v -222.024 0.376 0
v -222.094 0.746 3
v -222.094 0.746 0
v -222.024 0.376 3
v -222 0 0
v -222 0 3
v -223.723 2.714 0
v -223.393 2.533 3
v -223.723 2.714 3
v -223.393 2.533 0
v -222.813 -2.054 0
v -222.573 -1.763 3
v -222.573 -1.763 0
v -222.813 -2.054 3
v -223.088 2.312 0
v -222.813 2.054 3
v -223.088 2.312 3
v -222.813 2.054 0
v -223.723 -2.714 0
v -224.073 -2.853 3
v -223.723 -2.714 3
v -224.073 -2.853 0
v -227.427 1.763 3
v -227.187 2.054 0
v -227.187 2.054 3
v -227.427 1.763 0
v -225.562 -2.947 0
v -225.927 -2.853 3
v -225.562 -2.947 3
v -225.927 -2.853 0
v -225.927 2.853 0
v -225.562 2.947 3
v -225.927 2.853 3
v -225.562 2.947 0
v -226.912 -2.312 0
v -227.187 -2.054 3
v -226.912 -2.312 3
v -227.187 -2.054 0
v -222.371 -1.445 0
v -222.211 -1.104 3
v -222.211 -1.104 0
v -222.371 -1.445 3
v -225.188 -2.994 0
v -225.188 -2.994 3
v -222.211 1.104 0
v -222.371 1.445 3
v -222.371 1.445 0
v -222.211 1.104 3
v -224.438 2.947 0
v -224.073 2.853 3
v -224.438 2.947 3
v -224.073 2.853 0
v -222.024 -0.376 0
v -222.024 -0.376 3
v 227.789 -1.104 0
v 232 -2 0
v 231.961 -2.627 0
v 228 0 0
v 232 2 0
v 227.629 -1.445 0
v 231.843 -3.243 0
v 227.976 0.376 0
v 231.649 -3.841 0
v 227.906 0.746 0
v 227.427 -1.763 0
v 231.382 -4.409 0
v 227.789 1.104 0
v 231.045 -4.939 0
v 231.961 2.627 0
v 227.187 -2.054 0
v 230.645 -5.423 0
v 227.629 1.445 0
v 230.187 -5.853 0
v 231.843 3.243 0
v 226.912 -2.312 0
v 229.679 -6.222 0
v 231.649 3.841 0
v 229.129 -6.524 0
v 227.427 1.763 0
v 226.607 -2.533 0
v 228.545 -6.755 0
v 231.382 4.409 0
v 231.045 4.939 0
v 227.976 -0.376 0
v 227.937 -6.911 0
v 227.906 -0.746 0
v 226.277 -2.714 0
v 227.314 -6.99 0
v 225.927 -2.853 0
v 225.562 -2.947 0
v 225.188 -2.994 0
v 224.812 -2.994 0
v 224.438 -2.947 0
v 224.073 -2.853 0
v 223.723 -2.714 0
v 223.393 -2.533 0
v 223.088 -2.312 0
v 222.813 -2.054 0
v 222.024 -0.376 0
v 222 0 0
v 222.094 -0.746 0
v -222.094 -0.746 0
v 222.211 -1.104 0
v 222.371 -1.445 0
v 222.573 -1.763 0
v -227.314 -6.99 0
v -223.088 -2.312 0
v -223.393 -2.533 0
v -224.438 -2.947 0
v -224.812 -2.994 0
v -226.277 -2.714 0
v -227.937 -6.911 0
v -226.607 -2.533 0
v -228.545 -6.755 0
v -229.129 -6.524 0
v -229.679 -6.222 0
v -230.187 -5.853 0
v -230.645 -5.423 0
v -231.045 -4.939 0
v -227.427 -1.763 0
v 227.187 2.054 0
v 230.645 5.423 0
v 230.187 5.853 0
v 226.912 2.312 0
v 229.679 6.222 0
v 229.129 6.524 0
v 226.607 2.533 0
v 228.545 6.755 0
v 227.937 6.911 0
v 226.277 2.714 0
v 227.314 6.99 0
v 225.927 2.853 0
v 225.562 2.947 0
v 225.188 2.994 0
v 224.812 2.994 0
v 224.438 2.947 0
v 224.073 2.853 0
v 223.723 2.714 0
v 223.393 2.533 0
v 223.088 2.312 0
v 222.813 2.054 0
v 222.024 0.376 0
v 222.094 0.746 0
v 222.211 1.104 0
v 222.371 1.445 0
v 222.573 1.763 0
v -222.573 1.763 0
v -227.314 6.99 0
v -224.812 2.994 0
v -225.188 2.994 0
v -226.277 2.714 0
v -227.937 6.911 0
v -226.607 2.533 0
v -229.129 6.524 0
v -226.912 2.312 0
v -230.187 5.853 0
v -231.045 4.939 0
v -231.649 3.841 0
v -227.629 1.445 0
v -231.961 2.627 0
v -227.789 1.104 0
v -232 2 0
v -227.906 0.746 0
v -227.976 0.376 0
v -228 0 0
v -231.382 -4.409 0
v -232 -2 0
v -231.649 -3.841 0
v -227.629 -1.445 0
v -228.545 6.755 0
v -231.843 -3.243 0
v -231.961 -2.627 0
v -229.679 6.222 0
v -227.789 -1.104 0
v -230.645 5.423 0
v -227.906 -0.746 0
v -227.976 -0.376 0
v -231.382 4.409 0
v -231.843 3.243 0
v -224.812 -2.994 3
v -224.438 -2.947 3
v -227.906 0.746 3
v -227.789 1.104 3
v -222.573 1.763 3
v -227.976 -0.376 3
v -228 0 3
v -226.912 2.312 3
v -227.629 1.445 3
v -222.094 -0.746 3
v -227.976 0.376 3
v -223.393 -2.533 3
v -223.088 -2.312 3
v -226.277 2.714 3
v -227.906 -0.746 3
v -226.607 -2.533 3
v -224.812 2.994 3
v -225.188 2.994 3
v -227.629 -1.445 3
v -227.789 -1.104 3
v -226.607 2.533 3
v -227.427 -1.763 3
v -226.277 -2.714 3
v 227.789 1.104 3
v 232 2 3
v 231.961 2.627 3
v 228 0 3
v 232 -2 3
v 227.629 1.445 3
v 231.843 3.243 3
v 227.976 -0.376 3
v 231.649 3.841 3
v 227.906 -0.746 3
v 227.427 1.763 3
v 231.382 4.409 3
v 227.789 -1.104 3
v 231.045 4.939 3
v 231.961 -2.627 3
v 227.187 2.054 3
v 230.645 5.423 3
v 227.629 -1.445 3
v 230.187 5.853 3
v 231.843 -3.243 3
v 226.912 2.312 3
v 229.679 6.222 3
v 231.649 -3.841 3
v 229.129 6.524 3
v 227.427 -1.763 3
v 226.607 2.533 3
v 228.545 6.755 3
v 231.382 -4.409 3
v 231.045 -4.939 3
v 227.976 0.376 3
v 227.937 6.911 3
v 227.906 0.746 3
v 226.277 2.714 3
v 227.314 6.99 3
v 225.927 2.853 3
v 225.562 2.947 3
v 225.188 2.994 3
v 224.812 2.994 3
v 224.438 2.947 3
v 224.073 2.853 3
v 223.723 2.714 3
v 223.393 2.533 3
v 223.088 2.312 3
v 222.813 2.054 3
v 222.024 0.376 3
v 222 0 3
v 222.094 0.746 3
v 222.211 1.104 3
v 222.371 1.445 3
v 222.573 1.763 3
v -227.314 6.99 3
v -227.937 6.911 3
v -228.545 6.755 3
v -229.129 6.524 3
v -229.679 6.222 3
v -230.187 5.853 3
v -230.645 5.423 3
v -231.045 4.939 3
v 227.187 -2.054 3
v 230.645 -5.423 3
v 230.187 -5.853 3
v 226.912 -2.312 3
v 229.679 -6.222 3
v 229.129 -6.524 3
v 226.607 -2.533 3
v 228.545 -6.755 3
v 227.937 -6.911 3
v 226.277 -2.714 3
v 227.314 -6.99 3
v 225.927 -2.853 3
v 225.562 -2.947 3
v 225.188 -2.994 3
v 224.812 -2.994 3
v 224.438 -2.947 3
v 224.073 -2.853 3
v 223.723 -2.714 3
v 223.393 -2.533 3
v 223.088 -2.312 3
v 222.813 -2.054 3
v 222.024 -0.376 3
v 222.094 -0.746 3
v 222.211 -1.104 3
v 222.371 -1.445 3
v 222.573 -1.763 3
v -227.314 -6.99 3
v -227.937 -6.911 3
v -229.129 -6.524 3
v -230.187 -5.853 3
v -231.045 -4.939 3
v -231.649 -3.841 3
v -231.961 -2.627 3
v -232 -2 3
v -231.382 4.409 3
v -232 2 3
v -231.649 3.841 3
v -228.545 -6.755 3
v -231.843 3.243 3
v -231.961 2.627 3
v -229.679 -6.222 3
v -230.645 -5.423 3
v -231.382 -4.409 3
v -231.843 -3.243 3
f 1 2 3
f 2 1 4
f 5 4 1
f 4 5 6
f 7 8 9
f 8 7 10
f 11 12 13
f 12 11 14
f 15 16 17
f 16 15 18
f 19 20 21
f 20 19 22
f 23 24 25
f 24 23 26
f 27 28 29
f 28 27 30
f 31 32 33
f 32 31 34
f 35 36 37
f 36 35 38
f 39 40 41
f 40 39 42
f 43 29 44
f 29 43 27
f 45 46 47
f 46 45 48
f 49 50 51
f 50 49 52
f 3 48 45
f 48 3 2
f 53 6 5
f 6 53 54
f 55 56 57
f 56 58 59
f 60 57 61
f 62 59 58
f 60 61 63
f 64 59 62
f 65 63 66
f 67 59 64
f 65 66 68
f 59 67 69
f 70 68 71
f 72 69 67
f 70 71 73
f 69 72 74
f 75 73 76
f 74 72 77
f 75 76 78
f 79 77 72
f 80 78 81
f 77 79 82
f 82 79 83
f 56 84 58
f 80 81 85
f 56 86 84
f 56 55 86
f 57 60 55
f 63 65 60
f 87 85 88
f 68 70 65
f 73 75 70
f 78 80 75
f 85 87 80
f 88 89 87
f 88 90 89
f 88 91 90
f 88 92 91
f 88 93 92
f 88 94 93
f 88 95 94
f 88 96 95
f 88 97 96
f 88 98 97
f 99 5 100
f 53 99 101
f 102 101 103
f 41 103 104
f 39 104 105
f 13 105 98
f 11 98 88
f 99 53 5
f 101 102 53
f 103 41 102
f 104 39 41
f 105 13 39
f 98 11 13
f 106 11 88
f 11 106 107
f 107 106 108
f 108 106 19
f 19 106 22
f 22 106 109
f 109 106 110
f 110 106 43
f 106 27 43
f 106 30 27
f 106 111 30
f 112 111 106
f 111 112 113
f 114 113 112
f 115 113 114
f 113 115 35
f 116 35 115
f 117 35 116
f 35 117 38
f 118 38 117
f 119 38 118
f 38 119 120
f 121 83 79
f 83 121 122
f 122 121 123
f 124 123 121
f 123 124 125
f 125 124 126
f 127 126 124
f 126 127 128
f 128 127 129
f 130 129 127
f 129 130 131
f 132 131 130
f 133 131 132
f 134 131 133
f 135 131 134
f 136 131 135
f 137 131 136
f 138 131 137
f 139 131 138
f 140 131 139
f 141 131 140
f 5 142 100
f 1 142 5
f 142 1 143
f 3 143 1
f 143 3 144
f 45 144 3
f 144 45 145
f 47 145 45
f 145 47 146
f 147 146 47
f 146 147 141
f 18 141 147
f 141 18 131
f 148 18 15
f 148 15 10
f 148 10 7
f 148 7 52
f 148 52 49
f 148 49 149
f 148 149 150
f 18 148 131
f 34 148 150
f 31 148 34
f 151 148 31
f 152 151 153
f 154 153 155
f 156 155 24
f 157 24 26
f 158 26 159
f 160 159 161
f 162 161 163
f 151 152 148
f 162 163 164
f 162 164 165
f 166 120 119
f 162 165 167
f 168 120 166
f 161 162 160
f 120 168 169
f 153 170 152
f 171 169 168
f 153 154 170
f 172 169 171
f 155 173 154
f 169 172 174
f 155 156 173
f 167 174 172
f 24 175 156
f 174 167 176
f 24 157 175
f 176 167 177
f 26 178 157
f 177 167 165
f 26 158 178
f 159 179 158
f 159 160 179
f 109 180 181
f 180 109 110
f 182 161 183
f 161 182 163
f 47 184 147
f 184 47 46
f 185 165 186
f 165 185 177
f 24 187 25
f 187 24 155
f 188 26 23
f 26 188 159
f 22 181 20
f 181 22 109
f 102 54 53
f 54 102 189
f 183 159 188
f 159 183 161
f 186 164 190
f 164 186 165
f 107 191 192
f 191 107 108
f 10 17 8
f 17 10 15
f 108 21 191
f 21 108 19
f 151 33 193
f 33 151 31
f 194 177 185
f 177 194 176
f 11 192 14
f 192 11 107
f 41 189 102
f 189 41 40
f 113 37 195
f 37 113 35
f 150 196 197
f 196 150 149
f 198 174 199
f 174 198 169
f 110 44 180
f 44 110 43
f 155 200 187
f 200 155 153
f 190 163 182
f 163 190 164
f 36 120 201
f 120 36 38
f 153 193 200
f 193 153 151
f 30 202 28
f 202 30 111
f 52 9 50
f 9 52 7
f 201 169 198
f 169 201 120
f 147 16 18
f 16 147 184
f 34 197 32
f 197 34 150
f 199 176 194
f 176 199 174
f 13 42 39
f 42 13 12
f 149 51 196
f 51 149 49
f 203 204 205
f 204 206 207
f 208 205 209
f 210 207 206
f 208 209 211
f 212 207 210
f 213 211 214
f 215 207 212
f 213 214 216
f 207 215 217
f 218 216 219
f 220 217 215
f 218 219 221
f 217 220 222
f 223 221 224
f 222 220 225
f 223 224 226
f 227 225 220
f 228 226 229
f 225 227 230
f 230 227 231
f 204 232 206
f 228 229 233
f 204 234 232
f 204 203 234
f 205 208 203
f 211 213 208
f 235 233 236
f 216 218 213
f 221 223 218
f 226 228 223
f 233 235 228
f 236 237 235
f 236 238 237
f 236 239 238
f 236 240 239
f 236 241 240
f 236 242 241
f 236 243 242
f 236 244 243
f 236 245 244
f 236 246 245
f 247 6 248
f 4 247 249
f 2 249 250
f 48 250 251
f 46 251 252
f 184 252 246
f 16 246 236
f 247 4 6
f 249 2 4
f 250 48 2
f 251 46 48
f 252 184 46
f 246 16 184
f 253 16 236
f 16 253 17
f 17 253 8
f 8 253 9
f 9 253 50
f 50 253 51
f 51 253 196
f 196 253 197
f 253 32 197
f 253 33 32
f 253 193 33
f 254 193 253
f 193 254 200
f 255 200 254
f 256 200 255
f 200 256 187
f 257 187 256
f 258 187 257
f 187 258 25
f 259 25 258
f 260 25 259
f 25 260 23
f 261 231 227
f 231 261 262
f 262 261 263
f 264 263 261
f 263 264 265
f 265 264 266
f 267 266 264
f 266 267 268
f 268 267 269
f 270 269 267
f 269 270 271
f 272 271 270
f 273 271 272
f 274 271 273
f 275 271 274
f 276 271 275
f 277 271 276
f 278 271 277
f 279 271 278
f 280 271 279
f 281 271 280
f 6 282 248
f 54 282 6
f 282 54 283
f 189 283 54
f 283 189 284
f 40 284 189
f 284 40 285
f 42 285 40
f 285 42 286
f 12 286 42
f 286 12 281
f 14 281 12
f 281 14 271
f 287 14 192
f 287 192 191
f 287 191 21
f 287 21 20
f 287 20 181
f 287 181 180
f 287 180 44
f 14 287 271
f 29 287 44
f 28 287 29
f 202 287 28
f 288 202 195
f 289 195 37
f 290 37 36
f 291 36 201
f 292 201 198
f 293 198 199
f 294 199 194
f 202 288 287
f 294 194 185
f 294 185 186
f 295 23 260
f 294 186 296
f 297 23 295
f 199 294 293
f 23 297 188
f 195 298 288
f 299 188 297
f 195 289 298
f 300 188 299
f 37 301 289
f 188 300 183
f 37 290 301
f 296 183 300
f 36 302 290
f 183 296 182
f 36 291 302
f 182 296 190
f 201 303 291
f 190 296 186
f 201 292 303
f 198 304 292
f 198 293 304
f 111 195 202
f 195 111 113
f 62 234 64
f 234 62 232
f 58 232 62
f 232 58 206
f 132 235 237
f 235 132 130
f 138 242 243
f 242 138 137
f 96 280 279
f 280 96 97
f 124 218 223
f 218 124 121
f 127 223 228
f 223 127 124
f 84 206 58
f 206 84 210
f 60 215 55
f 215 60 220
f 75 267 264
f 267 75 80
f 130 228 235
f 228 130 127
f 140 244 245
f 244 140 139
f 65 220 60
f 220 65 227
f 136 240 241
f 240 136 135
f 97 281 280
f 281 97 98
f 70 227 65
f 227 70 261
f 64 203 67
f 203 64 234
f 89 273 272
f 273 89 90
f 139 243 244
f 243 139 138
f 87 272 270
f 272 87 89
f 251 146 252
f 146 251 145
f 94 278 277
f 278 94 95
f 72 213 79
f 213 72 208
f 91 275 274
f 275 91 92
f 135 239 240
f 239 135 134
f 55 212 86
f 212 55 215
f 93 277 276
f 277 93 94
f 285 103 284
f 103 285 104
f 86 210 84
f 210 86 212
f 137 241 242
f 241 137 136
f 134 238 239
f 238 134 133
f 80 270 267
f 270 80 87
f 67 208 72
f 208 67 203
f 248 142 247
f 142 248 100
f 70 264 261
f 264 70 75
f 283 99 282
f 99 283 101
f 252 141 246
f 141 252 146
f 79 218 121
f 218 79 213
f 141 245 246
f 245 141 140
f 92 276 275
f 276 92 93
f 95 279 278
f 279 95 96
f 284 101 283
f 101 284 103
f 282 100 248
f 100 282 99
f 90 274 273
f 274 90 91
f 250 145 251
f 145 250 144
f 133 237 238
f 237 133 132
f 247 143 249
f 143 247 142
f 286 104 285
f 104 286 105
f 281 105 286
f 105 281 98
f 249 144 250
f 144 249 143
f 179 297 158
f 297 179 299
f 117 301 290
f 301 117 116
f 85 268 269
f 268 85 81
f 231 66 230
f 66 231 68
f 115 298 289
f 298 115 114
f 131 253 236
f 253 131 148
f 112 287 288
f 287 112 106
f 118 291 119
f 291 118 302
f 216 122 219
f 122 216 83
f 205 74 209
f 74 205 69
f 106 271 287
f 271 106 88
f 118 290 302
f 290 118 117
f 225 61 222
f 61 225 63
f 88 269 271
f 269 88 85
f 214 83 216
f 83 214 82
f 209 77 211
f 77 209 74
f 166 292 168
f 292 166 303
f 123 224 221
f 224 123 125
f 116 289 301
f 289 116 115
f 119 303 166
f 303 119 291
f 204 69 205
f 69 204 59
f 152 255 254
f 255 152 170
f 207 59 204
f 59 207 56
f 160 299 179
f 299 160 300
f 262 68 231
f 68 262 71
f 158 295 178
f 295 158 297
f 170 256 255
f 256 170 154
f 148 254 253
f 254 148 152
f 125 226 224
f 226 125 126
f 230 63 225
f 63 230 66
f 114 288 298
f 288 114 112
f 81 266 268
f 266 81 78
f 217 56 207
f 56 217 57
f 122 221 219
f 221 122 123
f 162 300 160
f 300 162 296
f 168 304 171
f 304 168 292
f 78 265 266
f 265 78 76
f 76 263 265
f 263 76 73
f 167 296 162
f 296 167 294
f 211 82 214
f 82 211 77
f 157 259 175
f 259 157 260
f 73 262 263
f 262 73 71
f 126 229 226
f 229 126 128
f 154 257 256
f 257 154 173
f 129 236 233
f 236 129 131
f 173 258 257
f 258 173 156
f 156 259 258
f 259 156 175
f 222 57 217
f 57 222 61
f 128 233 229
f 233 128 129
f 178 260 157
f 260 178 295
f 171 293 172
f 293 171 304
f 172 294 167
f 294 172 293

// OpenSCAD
$fn = 50;


difference() {
	union() {
		hull() {
			translate(v = [-227.0000000000, 2.0000000000, 0]) {
				cylinder(h = 3, r = 5);
			}
			translate(v = [227.0000000000, 2.0000000000, 0]) {
				cylinder(h = 3, r = 5);
			}
			translate(v = [-227.0000000000, -2.0000000000, 0]) {
				cylinder(h = 3, r = 5);
			}
			translate(v = [227.0000000000, -2.0000000000, 0]) {
				cylinder(h = 3, r = 5);
			}
		}
	}
	union() {
		translate(v = [-225.0000000000, 0.0000000000, 0]) {
			cylinder(h = 3, r = 3.0000000000);
		}
		translate(v = [225.0000000000, 0.0000000000, 0]) {
			cylinder(h = 3, r = 3.0000000000);
		}
		translate(v = [-225.0000000000, 0.0000000000, 0]) {
			cylinder(h = 3, r = 1.5000000000);
		}
		translate(v = [225.0000000000, 0.0000000000, 0]) {
			cylinder(h = 3, r = 1.5000000000);
		}
		translate(v = [-225.0000000000, 0.0000000000, 0]) {
			cylinder(h = 3, r = 1.5000000000);
		}
		translate(v = [225.0000000000, 0.0000000000, 0]) {
			cylinder(h = 3, r = 1.5000000000);
		}
		translate(v = [-225.0000000000, 0.0000000000, 0]) {
			cylinder(h = 3, r = 1.5000000000);
		}
		translate(v = [225.0000000000, 0.0000000000, 0]) {
			cylinder(h = 3, r = 1.5000000000);
		}
	}
}
